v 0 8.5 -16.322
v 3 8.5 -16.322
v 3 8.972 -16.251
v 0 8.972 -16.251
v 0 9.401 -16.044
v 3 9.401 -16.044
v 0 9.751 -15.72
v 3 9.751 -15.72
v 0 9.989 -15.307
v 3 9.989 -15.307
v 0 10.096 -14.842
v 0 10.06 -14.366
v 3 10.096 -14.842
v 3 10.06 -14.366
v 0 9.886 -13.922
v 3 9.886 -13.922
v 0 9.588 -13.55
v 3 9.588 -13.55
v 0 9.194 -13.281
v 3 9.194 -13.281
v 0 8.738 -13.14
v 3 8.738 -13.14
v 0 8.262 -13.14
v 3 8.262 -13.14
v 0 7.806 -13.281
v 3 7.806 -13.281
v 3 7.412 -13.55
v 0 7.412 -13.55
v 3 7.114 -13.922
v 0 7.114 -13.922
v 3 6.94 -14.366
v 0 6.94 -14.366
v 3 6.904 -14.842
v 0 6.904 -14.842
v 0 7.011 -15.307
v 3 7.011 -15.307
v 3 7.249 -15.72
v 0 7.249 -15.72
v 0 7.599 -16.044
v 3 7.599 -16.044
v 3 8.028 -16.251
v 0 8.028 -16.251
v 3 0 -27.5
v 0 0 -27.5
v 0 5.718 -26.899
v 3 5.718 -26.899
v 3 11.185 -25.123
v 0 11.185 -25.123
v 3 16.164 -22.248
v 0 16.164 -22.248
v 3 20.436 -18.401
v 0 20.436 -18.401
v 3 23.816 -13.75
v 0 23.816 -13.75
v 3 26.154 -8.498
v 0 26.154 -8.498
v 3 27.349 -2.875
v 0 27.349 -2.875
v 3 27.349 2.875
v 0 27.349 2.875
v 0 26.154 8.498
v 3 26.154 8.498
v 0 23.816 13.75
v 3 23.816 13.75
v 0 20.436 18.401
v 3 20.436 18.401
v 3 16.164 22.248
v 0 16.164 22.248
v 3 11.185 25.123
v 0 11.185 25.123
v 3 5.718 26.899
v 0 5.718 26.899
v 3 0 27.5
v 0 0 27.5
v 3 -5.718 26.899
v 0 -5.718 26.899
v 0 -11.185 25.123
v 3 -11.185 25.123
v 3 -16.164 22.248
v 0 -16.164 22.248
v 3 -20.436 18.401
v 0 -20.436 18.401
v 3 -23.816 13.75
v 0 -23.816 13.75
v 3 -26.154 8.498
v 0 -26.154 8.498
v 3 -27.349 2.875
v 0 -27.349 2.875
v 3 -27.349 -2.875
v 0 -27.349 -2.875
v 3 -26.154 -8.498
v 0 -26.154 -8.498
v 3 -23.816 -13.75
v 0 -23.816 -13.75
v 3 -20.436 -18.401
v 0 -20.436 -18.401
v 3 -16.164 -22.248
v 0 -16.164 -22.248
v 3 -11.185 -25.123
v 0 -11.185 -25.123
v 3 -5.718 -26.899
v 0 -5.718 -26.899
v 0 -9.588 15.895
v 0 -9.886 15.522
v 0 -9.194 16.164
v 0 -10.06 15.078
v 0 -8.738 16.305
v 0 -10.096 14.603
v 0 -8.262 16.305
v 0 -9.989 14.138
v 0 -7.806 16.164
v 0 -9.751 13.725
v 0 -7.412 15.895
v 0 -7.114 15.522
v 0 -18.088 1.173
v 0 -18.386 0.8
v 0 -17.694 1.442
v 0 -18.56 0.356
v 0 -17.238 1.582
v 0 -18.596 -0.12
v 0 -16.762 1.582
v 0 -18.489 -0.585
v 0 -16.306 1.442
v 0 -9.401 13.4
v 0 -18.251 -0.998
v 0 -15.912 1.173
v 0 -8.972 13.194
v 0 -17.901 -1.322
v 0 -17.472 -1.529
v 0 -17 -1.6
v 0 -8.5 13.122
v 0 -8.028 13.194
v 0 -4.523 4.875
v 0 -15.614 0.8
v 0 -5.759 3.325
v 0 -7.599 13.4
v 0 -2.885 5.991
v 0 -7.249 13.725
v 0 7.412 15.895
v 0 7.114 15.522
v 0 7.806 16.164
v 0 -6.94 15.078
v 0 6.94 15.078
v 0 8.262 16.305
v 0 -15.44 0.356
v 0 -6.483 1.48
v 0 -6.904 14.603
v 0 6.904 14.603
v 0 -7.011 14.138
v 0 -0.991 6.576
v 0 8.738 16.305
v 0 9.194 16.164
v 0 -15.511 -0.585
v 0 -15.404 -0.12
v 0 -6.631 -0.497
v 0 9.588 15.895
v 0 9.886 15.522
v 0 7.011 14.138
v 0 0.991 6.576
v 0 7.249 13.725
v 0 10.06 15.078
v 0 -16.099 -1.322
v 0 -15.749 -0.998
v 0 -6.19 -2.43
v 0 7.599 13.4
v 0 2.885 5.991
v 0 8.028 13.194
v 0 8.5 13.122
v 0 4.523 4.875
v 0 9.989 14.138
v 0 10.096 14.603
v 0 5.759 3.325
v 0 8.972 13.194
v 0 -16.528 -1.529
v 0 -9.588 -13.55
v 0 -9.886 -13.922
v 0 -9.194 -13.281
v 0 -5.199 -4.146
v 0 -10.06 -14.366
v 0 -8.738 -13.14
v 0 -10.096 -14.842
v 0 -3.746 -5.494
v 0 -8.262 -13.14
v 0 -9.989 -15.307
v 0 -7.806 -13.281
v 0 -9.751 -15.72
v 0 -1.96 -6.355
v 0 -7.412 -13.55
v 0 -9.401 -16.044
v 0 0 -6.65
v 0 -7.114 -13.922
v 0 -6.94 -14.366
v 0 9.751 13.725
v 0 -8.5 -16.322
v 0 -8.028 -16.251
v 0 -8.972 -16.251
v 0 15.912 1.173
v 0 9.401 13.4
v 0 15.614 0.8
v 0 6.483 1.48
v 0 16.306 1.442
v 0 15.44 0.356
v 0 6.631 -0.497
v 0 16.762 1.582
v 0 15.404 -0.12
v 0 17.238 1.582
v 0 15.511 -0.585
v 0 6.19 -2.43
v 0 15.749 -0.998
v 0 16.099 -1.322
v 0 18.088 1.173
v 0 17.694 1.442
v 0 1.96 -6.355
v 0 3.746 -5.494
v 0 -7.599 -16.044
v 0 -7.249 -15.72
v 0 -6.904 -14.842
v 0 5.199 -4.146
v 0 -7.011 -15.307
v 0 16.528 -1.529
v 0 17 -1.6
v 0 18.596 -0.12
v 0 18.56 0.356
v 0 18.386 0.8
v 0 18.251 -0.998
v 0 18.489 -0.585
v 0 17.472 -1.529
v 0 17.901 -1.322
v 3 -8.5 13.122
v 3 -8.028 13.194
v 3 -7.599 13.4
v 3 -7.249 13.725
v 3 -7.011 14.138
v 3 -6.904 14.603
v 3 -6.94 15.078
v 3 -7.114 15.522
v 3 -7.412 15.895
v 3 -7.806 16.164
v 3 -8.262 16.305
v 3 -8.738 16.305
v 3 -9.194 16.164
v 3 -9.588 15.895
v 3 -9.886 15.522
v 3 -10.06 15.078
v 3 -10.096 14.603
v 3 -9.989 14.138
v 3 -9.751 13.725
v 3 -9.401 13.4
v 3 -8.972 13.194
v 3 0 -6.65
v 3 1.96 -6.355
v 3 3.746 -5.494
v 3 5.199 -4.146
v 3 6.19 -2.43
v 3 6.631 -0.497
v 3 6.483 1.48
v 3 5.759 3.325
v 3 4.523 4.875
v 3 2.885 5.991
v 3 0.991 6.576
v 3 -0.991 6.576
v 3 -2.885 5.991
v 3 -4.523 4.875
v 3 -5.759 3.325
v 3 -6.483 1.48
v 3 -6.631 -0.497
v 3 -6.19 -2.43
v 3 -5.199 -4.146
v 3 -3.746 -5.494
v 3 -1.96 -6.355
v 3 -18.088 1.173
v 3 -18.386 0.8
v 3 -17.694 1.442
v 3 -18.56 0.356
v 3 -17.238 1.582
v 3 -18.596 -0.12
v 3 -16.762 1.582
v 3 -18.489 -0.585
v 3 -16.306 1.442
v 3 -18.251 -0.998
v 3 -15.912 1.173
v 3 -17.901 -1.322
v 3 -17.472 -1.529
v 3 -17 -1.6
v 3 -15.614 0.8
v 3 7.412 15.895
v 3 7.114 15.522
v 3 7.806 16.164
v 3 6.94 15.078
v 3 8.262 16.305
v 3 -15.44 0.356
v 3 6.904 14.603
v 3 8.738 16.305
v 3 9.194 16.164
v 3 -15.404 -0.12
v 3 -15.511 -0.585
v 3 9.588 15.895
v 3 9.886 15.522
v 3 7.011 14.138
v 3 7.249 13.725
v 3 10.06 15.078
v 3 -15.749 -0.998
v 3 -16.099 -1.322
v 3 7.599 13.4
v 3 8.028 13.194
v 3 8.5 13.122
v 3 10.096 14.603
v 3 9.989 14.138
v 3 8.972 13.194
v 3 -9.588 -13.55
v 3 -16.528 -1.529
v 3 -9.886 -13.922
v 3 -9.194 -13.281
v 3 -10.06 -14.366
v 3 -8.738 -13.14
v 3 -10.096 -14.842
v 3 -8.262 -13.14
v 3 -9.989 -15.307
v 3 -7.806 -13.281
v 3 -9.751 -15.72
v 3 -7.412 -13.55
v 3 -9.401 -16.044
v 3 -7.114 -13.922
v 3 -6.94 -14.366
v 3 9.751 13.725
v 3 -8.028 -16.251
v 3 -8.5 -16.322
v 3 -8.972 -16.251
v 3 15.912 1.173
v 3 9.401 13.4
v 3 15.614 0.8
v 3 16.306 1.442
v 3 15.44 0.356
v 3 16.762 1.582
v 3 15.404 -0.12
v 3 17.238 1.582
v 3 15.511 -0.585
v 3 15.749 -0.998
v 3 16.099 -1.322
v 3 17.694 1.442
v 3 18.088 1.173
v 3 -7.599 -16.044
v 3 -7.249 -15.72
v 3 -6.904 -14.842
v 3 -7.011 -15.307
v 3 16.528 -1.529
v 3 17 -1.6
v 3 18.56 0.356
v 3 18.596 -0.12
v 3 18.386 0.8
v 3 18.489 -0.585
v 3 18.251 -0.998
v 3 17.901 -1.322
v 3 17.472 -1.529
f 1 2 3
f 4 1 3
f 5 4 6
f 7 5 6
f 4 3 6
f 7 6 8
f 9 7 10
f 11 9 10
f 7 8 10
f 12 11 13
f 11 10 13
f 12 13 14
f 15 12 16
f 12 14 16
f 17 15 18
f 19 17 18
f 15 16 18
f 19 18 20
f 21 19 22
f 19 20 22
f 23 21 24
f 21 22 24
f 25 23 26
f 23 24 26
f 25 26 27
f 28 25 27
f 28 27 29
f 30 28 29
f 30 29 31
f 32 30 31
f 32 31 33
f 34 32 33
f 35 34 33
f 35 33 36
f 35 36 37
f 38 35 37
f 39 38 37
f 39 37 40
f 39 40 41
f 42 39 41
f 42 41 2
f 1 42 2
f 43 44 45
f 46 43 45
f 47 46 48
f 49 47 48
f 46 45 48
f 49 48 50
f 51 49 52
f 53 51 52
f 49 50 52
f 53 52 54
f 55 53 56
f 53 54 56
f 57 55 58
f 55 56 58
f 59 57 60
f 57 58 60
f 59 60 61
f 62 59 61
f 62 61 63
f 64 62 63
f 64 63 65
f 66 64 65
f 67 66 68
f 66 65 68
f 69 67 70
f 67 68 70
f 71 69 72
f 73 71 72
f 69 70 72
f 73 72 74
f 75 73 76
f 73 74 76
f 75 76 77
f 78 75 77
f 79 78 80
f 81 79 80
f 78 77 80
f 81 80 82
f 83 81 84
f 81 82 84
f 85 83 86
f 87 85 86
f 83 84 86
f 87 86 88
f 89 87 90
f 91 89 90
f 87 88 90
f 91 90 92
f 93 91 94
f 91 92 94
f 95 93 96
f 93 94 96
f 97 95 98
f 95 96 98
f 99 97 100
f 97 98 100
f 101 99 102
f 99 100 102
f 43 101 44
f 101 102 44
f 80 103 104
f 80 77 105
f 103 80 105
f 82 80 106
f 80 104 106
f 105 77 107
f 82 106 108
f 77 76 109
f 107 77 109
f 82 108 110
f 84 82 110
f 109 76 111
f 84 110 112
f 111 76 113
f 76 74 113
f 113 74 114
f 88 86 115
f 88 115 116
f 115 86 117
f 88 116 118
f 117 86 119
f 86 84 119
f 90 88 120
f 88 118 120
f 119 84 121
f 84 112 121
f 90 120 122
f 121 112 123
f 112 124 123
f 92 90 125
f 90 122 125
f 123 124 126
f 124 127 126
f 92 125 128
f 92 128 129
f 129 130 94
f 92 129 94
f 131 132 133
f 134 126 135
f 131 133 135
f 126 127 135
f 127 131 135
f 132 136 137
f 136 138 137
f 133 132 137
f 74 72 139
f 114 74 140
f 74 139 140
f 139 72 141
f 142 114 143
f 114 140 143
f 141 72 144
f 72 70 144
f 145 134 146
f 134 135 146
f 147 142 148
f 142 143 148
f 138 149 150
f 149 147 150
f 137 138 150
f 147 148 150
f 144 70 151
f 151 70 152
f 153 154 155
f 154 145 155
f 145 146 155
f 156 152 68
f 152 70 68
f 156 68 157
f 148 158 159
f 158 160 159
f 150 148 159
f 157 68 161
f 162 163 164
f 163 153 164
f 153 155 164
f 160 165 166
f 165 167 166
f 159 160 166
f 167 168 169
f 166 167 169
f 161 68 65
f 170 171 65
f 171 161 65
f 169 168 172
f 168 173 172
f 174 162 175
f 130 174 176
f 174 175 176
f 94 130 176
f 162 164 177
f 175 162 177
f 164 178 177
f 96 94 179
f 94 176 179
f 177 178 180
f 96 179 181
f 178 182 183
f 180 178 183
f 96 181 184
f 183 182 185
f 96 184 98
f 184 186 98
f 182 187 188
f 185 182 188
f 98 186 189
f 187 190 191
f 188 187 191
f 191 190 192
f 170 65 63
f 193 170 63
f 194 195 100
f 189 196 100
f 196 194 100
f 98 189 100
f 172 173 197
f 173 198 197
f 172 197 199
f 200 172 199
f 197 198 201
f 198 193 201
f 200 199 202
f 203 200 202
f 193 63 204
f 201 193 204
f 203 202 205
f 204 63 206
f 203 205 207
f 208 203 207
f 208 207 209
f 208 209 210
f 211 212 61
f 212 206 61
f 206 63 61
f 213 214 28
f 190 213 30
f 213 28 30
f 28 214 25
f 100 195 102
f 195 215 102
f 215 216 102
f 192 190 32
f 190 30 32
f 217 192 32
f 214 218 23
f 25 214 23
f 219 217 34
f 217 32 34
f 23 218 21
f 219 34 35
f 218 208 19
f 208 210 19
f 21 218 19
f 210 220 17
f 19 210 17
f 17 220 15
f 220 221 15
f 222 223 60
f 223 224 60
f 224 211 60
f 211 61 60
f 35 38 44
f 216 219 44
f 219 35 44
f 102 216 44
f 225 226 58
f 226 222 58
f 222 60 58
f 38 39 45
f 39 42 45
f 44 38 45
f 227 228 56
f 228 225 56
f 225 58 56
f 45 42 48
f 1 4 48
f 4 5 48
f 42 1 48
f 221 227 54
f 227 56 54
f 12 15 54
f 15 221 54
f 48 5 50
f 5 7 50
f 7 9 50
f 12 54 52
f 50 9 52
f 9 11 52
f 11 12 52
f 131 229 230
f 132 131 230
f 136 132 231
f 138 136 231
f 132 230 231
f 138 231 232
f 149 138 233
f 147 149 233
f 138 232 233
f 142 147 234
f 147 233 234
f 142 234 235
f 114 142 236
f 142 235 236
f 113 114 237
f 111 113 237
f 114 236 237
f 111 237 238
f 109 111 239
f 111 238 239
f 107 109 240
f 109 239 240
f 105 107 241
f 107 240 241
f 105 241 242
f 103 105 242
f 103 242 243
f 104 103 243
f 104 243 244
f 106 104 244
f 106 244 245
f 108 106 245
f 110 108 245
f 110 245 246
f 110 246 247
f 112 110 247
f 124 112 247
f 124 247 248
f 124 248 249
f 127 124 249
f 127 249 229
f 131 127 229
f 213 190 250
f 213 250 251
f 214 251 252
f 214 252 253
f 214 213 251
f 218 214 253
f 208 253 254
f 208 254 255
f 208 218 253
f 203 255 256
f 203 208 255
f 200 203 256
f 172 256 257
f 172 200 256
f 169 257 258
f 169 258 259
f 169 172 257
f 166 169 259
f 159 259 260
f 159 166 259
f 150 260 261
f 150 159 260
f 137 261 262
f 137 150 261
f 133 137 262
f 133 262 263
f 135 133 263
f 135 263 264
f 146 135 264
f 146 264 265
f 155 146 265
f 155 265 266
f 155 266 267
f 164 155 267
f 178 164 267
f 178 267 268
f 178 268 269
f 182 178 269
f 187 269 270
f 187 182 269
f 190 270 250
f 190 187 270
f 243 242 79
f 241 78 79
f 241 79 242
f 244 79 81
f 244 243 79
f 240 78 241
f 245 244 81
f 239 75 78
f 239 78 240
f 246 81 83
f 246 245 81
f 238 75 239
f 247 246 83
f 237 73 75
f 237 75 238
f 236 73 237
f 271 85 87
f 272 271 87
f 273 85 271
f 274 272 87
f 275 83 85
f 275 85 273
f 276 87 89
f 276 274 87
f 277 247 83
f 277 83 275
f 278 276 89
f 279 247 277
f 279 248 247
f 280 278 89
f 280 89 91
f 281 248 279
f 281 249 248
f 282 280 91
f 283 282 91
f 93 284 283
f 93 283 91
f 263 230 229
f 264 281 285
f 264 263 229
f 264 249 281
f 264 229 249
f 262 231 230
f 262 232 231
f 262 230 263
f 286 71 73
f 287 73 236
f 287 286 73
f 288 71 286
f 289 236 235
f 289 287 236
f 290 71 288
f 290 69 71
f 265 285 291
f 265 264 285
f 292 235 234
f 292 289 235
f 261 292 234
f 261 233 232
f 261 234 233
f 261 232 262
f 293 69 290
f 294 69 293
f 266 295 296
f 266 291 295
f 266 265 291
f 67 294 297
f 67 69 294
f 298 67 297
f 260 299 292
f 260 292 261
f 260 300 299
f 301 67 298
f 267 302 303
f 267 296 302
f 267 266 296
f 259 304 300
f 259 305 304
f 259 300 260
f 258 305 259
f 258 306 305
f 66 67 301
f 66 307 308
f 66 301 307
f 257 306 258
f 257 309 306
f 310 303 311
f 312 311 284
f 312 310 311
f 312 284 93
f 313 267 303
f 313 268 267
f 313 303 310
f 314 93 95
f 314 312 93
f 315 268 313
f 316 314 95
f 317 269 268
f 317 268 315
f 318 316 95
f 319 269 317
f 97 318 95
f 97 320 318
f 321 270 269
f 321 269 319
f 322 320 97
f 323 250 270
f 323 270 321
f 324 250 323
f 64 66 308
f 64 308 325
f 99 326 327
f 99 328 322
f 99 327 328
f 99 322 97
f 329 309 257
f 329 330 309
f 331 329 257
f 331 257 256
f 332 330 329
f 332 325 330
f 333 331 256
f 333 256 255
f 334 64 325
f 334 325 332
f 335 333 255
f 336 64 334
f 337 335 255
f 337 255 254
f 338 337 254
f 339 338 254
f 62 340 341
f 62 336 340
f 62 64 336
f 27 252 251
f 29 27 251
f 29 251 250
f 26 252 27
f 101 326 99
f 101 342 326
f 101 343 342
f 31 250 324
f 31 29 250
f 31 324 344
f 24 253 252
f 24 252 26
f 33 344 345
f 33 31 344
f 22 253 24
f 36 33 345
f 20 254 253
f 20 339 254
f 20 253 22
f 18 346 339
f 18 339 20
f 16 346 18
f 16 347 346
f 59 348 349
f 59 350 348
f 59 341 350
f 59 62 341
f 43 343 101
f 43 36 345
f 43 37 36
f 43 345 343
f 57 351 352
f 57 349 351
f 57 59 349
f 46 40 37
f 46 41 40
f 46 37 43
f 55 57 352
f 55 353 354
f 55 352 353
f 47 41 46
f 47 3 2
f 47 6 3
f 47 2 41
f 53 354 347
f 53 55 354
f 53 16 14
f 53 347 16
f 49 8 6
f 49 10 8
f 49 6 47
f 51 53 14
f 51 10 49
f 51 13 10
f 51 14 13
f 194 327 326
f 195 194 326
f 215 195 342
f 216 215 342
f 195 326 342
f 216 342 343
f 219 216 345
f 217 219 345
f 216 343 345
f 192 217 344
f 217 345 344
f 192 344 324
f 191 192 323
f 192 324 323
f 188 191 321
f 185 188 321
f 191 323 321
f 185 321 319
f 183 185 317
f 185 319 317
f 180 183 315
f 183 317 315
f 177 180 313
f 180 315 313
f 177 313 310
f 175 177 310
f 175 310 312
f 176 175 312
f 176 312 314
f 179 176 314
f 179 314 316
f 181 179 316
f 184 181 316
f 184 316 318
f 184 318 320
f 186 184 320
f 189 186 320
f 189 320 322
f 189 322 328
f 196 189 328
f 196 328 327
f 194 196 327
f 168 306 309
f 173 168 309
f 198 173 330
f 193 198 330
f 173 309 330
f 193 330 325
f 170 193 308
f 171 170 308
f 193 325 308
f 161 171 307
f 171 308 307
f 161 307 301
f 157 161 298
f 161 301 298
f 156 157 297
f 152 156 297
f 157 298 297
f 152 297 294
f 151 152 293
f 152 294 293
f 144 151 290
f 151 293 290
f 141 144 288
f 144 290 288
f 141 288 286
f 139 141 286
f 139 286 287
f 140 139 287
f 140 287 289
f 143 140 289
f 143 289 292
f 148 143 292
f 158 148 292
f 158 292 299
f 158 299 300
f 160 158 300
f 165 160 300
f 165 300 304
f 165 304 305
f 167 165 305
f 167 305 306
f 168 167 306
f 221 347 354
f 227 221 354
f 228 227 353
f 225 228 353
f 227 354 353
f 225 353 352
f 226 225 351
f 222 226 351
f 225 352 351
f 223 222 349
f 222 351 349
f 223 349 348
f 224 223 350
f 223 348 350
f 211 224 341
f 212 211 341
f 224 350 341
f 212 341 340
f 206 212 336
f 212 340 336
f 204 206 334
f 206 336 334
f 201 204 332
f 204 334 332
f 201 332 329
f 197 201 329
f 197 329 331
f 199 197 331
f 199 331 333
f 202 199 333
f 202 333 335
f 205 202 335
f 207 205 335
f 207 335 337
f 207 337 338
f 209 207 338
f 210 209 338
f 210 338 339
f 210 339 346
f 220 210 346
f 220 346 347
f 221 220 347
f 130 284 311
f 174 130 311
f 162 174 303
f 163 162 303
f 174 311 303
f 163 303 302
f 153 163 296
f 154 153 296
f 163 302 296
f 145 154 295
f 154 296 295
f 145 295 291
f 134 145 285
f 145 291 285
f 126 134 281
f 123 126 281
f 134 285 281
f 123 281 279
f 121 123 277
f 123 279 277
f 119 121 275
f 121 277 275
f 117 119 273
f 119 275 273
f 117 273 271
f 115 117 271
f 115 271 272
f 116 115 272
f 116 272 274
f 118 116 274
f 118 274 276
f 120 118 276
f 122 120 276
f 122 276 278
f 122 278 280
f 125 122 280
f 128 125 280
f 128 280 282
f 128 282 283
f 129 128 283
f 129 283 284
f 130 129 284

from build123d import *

# Parameters (mm, degrees)
SKETCH1_R           = 27.5
SKETCH1_R_2         = 6.65
BOSS_EXTRUDE1_DEPTH = 3
SKETCH3_R           = 1.6
CUT_EXTRUDE1_DEPTH  = 4


with BuildPart() as part:
    # Sketch1 → Boss-Extrude1 (new body)
    with BuildSketch(Plane(origin=(0, 0, 0), x_dir=(0, 0, -1), z_dir=(1, 0, 0))):
        Circle(SKETCH1_R)
        Circle(SKETCH1_R_2, mode=Mode.SUBTRACT)
    extrude(amount=BOSS_EXTRUDE1_DEPTH)

    # Sketch3 → Cut-Extrude1 (cut, through all)
    with BuildSketch(Plane(origin=(3, 0, 0), x_dir=(0, 0, -1), z_dir=(1, 0, 0))):
        with Locations((0, 17)):
            Circle(SKETCH3_R)
        with Locations((14.722431864, 8.5)):
            Circle(SKETCH3_R)
        with Locations((14.722431864, -8.5)):
            Circle(SKETCH3_R)
        with Locations((0, -17)):
            Circle(SKETCH3_R)
        with Locations((-14.722431864, -8.5)):
            Circle(SKETCH3_R)
        with Locations((-14.722431864, 8.5)):
            Circle(SKETCH3_R)
    extrude(amount=-CUT_EXTRUDE1_DEPTH, mode=Mode.SUBTRACT)


solid = part.part
